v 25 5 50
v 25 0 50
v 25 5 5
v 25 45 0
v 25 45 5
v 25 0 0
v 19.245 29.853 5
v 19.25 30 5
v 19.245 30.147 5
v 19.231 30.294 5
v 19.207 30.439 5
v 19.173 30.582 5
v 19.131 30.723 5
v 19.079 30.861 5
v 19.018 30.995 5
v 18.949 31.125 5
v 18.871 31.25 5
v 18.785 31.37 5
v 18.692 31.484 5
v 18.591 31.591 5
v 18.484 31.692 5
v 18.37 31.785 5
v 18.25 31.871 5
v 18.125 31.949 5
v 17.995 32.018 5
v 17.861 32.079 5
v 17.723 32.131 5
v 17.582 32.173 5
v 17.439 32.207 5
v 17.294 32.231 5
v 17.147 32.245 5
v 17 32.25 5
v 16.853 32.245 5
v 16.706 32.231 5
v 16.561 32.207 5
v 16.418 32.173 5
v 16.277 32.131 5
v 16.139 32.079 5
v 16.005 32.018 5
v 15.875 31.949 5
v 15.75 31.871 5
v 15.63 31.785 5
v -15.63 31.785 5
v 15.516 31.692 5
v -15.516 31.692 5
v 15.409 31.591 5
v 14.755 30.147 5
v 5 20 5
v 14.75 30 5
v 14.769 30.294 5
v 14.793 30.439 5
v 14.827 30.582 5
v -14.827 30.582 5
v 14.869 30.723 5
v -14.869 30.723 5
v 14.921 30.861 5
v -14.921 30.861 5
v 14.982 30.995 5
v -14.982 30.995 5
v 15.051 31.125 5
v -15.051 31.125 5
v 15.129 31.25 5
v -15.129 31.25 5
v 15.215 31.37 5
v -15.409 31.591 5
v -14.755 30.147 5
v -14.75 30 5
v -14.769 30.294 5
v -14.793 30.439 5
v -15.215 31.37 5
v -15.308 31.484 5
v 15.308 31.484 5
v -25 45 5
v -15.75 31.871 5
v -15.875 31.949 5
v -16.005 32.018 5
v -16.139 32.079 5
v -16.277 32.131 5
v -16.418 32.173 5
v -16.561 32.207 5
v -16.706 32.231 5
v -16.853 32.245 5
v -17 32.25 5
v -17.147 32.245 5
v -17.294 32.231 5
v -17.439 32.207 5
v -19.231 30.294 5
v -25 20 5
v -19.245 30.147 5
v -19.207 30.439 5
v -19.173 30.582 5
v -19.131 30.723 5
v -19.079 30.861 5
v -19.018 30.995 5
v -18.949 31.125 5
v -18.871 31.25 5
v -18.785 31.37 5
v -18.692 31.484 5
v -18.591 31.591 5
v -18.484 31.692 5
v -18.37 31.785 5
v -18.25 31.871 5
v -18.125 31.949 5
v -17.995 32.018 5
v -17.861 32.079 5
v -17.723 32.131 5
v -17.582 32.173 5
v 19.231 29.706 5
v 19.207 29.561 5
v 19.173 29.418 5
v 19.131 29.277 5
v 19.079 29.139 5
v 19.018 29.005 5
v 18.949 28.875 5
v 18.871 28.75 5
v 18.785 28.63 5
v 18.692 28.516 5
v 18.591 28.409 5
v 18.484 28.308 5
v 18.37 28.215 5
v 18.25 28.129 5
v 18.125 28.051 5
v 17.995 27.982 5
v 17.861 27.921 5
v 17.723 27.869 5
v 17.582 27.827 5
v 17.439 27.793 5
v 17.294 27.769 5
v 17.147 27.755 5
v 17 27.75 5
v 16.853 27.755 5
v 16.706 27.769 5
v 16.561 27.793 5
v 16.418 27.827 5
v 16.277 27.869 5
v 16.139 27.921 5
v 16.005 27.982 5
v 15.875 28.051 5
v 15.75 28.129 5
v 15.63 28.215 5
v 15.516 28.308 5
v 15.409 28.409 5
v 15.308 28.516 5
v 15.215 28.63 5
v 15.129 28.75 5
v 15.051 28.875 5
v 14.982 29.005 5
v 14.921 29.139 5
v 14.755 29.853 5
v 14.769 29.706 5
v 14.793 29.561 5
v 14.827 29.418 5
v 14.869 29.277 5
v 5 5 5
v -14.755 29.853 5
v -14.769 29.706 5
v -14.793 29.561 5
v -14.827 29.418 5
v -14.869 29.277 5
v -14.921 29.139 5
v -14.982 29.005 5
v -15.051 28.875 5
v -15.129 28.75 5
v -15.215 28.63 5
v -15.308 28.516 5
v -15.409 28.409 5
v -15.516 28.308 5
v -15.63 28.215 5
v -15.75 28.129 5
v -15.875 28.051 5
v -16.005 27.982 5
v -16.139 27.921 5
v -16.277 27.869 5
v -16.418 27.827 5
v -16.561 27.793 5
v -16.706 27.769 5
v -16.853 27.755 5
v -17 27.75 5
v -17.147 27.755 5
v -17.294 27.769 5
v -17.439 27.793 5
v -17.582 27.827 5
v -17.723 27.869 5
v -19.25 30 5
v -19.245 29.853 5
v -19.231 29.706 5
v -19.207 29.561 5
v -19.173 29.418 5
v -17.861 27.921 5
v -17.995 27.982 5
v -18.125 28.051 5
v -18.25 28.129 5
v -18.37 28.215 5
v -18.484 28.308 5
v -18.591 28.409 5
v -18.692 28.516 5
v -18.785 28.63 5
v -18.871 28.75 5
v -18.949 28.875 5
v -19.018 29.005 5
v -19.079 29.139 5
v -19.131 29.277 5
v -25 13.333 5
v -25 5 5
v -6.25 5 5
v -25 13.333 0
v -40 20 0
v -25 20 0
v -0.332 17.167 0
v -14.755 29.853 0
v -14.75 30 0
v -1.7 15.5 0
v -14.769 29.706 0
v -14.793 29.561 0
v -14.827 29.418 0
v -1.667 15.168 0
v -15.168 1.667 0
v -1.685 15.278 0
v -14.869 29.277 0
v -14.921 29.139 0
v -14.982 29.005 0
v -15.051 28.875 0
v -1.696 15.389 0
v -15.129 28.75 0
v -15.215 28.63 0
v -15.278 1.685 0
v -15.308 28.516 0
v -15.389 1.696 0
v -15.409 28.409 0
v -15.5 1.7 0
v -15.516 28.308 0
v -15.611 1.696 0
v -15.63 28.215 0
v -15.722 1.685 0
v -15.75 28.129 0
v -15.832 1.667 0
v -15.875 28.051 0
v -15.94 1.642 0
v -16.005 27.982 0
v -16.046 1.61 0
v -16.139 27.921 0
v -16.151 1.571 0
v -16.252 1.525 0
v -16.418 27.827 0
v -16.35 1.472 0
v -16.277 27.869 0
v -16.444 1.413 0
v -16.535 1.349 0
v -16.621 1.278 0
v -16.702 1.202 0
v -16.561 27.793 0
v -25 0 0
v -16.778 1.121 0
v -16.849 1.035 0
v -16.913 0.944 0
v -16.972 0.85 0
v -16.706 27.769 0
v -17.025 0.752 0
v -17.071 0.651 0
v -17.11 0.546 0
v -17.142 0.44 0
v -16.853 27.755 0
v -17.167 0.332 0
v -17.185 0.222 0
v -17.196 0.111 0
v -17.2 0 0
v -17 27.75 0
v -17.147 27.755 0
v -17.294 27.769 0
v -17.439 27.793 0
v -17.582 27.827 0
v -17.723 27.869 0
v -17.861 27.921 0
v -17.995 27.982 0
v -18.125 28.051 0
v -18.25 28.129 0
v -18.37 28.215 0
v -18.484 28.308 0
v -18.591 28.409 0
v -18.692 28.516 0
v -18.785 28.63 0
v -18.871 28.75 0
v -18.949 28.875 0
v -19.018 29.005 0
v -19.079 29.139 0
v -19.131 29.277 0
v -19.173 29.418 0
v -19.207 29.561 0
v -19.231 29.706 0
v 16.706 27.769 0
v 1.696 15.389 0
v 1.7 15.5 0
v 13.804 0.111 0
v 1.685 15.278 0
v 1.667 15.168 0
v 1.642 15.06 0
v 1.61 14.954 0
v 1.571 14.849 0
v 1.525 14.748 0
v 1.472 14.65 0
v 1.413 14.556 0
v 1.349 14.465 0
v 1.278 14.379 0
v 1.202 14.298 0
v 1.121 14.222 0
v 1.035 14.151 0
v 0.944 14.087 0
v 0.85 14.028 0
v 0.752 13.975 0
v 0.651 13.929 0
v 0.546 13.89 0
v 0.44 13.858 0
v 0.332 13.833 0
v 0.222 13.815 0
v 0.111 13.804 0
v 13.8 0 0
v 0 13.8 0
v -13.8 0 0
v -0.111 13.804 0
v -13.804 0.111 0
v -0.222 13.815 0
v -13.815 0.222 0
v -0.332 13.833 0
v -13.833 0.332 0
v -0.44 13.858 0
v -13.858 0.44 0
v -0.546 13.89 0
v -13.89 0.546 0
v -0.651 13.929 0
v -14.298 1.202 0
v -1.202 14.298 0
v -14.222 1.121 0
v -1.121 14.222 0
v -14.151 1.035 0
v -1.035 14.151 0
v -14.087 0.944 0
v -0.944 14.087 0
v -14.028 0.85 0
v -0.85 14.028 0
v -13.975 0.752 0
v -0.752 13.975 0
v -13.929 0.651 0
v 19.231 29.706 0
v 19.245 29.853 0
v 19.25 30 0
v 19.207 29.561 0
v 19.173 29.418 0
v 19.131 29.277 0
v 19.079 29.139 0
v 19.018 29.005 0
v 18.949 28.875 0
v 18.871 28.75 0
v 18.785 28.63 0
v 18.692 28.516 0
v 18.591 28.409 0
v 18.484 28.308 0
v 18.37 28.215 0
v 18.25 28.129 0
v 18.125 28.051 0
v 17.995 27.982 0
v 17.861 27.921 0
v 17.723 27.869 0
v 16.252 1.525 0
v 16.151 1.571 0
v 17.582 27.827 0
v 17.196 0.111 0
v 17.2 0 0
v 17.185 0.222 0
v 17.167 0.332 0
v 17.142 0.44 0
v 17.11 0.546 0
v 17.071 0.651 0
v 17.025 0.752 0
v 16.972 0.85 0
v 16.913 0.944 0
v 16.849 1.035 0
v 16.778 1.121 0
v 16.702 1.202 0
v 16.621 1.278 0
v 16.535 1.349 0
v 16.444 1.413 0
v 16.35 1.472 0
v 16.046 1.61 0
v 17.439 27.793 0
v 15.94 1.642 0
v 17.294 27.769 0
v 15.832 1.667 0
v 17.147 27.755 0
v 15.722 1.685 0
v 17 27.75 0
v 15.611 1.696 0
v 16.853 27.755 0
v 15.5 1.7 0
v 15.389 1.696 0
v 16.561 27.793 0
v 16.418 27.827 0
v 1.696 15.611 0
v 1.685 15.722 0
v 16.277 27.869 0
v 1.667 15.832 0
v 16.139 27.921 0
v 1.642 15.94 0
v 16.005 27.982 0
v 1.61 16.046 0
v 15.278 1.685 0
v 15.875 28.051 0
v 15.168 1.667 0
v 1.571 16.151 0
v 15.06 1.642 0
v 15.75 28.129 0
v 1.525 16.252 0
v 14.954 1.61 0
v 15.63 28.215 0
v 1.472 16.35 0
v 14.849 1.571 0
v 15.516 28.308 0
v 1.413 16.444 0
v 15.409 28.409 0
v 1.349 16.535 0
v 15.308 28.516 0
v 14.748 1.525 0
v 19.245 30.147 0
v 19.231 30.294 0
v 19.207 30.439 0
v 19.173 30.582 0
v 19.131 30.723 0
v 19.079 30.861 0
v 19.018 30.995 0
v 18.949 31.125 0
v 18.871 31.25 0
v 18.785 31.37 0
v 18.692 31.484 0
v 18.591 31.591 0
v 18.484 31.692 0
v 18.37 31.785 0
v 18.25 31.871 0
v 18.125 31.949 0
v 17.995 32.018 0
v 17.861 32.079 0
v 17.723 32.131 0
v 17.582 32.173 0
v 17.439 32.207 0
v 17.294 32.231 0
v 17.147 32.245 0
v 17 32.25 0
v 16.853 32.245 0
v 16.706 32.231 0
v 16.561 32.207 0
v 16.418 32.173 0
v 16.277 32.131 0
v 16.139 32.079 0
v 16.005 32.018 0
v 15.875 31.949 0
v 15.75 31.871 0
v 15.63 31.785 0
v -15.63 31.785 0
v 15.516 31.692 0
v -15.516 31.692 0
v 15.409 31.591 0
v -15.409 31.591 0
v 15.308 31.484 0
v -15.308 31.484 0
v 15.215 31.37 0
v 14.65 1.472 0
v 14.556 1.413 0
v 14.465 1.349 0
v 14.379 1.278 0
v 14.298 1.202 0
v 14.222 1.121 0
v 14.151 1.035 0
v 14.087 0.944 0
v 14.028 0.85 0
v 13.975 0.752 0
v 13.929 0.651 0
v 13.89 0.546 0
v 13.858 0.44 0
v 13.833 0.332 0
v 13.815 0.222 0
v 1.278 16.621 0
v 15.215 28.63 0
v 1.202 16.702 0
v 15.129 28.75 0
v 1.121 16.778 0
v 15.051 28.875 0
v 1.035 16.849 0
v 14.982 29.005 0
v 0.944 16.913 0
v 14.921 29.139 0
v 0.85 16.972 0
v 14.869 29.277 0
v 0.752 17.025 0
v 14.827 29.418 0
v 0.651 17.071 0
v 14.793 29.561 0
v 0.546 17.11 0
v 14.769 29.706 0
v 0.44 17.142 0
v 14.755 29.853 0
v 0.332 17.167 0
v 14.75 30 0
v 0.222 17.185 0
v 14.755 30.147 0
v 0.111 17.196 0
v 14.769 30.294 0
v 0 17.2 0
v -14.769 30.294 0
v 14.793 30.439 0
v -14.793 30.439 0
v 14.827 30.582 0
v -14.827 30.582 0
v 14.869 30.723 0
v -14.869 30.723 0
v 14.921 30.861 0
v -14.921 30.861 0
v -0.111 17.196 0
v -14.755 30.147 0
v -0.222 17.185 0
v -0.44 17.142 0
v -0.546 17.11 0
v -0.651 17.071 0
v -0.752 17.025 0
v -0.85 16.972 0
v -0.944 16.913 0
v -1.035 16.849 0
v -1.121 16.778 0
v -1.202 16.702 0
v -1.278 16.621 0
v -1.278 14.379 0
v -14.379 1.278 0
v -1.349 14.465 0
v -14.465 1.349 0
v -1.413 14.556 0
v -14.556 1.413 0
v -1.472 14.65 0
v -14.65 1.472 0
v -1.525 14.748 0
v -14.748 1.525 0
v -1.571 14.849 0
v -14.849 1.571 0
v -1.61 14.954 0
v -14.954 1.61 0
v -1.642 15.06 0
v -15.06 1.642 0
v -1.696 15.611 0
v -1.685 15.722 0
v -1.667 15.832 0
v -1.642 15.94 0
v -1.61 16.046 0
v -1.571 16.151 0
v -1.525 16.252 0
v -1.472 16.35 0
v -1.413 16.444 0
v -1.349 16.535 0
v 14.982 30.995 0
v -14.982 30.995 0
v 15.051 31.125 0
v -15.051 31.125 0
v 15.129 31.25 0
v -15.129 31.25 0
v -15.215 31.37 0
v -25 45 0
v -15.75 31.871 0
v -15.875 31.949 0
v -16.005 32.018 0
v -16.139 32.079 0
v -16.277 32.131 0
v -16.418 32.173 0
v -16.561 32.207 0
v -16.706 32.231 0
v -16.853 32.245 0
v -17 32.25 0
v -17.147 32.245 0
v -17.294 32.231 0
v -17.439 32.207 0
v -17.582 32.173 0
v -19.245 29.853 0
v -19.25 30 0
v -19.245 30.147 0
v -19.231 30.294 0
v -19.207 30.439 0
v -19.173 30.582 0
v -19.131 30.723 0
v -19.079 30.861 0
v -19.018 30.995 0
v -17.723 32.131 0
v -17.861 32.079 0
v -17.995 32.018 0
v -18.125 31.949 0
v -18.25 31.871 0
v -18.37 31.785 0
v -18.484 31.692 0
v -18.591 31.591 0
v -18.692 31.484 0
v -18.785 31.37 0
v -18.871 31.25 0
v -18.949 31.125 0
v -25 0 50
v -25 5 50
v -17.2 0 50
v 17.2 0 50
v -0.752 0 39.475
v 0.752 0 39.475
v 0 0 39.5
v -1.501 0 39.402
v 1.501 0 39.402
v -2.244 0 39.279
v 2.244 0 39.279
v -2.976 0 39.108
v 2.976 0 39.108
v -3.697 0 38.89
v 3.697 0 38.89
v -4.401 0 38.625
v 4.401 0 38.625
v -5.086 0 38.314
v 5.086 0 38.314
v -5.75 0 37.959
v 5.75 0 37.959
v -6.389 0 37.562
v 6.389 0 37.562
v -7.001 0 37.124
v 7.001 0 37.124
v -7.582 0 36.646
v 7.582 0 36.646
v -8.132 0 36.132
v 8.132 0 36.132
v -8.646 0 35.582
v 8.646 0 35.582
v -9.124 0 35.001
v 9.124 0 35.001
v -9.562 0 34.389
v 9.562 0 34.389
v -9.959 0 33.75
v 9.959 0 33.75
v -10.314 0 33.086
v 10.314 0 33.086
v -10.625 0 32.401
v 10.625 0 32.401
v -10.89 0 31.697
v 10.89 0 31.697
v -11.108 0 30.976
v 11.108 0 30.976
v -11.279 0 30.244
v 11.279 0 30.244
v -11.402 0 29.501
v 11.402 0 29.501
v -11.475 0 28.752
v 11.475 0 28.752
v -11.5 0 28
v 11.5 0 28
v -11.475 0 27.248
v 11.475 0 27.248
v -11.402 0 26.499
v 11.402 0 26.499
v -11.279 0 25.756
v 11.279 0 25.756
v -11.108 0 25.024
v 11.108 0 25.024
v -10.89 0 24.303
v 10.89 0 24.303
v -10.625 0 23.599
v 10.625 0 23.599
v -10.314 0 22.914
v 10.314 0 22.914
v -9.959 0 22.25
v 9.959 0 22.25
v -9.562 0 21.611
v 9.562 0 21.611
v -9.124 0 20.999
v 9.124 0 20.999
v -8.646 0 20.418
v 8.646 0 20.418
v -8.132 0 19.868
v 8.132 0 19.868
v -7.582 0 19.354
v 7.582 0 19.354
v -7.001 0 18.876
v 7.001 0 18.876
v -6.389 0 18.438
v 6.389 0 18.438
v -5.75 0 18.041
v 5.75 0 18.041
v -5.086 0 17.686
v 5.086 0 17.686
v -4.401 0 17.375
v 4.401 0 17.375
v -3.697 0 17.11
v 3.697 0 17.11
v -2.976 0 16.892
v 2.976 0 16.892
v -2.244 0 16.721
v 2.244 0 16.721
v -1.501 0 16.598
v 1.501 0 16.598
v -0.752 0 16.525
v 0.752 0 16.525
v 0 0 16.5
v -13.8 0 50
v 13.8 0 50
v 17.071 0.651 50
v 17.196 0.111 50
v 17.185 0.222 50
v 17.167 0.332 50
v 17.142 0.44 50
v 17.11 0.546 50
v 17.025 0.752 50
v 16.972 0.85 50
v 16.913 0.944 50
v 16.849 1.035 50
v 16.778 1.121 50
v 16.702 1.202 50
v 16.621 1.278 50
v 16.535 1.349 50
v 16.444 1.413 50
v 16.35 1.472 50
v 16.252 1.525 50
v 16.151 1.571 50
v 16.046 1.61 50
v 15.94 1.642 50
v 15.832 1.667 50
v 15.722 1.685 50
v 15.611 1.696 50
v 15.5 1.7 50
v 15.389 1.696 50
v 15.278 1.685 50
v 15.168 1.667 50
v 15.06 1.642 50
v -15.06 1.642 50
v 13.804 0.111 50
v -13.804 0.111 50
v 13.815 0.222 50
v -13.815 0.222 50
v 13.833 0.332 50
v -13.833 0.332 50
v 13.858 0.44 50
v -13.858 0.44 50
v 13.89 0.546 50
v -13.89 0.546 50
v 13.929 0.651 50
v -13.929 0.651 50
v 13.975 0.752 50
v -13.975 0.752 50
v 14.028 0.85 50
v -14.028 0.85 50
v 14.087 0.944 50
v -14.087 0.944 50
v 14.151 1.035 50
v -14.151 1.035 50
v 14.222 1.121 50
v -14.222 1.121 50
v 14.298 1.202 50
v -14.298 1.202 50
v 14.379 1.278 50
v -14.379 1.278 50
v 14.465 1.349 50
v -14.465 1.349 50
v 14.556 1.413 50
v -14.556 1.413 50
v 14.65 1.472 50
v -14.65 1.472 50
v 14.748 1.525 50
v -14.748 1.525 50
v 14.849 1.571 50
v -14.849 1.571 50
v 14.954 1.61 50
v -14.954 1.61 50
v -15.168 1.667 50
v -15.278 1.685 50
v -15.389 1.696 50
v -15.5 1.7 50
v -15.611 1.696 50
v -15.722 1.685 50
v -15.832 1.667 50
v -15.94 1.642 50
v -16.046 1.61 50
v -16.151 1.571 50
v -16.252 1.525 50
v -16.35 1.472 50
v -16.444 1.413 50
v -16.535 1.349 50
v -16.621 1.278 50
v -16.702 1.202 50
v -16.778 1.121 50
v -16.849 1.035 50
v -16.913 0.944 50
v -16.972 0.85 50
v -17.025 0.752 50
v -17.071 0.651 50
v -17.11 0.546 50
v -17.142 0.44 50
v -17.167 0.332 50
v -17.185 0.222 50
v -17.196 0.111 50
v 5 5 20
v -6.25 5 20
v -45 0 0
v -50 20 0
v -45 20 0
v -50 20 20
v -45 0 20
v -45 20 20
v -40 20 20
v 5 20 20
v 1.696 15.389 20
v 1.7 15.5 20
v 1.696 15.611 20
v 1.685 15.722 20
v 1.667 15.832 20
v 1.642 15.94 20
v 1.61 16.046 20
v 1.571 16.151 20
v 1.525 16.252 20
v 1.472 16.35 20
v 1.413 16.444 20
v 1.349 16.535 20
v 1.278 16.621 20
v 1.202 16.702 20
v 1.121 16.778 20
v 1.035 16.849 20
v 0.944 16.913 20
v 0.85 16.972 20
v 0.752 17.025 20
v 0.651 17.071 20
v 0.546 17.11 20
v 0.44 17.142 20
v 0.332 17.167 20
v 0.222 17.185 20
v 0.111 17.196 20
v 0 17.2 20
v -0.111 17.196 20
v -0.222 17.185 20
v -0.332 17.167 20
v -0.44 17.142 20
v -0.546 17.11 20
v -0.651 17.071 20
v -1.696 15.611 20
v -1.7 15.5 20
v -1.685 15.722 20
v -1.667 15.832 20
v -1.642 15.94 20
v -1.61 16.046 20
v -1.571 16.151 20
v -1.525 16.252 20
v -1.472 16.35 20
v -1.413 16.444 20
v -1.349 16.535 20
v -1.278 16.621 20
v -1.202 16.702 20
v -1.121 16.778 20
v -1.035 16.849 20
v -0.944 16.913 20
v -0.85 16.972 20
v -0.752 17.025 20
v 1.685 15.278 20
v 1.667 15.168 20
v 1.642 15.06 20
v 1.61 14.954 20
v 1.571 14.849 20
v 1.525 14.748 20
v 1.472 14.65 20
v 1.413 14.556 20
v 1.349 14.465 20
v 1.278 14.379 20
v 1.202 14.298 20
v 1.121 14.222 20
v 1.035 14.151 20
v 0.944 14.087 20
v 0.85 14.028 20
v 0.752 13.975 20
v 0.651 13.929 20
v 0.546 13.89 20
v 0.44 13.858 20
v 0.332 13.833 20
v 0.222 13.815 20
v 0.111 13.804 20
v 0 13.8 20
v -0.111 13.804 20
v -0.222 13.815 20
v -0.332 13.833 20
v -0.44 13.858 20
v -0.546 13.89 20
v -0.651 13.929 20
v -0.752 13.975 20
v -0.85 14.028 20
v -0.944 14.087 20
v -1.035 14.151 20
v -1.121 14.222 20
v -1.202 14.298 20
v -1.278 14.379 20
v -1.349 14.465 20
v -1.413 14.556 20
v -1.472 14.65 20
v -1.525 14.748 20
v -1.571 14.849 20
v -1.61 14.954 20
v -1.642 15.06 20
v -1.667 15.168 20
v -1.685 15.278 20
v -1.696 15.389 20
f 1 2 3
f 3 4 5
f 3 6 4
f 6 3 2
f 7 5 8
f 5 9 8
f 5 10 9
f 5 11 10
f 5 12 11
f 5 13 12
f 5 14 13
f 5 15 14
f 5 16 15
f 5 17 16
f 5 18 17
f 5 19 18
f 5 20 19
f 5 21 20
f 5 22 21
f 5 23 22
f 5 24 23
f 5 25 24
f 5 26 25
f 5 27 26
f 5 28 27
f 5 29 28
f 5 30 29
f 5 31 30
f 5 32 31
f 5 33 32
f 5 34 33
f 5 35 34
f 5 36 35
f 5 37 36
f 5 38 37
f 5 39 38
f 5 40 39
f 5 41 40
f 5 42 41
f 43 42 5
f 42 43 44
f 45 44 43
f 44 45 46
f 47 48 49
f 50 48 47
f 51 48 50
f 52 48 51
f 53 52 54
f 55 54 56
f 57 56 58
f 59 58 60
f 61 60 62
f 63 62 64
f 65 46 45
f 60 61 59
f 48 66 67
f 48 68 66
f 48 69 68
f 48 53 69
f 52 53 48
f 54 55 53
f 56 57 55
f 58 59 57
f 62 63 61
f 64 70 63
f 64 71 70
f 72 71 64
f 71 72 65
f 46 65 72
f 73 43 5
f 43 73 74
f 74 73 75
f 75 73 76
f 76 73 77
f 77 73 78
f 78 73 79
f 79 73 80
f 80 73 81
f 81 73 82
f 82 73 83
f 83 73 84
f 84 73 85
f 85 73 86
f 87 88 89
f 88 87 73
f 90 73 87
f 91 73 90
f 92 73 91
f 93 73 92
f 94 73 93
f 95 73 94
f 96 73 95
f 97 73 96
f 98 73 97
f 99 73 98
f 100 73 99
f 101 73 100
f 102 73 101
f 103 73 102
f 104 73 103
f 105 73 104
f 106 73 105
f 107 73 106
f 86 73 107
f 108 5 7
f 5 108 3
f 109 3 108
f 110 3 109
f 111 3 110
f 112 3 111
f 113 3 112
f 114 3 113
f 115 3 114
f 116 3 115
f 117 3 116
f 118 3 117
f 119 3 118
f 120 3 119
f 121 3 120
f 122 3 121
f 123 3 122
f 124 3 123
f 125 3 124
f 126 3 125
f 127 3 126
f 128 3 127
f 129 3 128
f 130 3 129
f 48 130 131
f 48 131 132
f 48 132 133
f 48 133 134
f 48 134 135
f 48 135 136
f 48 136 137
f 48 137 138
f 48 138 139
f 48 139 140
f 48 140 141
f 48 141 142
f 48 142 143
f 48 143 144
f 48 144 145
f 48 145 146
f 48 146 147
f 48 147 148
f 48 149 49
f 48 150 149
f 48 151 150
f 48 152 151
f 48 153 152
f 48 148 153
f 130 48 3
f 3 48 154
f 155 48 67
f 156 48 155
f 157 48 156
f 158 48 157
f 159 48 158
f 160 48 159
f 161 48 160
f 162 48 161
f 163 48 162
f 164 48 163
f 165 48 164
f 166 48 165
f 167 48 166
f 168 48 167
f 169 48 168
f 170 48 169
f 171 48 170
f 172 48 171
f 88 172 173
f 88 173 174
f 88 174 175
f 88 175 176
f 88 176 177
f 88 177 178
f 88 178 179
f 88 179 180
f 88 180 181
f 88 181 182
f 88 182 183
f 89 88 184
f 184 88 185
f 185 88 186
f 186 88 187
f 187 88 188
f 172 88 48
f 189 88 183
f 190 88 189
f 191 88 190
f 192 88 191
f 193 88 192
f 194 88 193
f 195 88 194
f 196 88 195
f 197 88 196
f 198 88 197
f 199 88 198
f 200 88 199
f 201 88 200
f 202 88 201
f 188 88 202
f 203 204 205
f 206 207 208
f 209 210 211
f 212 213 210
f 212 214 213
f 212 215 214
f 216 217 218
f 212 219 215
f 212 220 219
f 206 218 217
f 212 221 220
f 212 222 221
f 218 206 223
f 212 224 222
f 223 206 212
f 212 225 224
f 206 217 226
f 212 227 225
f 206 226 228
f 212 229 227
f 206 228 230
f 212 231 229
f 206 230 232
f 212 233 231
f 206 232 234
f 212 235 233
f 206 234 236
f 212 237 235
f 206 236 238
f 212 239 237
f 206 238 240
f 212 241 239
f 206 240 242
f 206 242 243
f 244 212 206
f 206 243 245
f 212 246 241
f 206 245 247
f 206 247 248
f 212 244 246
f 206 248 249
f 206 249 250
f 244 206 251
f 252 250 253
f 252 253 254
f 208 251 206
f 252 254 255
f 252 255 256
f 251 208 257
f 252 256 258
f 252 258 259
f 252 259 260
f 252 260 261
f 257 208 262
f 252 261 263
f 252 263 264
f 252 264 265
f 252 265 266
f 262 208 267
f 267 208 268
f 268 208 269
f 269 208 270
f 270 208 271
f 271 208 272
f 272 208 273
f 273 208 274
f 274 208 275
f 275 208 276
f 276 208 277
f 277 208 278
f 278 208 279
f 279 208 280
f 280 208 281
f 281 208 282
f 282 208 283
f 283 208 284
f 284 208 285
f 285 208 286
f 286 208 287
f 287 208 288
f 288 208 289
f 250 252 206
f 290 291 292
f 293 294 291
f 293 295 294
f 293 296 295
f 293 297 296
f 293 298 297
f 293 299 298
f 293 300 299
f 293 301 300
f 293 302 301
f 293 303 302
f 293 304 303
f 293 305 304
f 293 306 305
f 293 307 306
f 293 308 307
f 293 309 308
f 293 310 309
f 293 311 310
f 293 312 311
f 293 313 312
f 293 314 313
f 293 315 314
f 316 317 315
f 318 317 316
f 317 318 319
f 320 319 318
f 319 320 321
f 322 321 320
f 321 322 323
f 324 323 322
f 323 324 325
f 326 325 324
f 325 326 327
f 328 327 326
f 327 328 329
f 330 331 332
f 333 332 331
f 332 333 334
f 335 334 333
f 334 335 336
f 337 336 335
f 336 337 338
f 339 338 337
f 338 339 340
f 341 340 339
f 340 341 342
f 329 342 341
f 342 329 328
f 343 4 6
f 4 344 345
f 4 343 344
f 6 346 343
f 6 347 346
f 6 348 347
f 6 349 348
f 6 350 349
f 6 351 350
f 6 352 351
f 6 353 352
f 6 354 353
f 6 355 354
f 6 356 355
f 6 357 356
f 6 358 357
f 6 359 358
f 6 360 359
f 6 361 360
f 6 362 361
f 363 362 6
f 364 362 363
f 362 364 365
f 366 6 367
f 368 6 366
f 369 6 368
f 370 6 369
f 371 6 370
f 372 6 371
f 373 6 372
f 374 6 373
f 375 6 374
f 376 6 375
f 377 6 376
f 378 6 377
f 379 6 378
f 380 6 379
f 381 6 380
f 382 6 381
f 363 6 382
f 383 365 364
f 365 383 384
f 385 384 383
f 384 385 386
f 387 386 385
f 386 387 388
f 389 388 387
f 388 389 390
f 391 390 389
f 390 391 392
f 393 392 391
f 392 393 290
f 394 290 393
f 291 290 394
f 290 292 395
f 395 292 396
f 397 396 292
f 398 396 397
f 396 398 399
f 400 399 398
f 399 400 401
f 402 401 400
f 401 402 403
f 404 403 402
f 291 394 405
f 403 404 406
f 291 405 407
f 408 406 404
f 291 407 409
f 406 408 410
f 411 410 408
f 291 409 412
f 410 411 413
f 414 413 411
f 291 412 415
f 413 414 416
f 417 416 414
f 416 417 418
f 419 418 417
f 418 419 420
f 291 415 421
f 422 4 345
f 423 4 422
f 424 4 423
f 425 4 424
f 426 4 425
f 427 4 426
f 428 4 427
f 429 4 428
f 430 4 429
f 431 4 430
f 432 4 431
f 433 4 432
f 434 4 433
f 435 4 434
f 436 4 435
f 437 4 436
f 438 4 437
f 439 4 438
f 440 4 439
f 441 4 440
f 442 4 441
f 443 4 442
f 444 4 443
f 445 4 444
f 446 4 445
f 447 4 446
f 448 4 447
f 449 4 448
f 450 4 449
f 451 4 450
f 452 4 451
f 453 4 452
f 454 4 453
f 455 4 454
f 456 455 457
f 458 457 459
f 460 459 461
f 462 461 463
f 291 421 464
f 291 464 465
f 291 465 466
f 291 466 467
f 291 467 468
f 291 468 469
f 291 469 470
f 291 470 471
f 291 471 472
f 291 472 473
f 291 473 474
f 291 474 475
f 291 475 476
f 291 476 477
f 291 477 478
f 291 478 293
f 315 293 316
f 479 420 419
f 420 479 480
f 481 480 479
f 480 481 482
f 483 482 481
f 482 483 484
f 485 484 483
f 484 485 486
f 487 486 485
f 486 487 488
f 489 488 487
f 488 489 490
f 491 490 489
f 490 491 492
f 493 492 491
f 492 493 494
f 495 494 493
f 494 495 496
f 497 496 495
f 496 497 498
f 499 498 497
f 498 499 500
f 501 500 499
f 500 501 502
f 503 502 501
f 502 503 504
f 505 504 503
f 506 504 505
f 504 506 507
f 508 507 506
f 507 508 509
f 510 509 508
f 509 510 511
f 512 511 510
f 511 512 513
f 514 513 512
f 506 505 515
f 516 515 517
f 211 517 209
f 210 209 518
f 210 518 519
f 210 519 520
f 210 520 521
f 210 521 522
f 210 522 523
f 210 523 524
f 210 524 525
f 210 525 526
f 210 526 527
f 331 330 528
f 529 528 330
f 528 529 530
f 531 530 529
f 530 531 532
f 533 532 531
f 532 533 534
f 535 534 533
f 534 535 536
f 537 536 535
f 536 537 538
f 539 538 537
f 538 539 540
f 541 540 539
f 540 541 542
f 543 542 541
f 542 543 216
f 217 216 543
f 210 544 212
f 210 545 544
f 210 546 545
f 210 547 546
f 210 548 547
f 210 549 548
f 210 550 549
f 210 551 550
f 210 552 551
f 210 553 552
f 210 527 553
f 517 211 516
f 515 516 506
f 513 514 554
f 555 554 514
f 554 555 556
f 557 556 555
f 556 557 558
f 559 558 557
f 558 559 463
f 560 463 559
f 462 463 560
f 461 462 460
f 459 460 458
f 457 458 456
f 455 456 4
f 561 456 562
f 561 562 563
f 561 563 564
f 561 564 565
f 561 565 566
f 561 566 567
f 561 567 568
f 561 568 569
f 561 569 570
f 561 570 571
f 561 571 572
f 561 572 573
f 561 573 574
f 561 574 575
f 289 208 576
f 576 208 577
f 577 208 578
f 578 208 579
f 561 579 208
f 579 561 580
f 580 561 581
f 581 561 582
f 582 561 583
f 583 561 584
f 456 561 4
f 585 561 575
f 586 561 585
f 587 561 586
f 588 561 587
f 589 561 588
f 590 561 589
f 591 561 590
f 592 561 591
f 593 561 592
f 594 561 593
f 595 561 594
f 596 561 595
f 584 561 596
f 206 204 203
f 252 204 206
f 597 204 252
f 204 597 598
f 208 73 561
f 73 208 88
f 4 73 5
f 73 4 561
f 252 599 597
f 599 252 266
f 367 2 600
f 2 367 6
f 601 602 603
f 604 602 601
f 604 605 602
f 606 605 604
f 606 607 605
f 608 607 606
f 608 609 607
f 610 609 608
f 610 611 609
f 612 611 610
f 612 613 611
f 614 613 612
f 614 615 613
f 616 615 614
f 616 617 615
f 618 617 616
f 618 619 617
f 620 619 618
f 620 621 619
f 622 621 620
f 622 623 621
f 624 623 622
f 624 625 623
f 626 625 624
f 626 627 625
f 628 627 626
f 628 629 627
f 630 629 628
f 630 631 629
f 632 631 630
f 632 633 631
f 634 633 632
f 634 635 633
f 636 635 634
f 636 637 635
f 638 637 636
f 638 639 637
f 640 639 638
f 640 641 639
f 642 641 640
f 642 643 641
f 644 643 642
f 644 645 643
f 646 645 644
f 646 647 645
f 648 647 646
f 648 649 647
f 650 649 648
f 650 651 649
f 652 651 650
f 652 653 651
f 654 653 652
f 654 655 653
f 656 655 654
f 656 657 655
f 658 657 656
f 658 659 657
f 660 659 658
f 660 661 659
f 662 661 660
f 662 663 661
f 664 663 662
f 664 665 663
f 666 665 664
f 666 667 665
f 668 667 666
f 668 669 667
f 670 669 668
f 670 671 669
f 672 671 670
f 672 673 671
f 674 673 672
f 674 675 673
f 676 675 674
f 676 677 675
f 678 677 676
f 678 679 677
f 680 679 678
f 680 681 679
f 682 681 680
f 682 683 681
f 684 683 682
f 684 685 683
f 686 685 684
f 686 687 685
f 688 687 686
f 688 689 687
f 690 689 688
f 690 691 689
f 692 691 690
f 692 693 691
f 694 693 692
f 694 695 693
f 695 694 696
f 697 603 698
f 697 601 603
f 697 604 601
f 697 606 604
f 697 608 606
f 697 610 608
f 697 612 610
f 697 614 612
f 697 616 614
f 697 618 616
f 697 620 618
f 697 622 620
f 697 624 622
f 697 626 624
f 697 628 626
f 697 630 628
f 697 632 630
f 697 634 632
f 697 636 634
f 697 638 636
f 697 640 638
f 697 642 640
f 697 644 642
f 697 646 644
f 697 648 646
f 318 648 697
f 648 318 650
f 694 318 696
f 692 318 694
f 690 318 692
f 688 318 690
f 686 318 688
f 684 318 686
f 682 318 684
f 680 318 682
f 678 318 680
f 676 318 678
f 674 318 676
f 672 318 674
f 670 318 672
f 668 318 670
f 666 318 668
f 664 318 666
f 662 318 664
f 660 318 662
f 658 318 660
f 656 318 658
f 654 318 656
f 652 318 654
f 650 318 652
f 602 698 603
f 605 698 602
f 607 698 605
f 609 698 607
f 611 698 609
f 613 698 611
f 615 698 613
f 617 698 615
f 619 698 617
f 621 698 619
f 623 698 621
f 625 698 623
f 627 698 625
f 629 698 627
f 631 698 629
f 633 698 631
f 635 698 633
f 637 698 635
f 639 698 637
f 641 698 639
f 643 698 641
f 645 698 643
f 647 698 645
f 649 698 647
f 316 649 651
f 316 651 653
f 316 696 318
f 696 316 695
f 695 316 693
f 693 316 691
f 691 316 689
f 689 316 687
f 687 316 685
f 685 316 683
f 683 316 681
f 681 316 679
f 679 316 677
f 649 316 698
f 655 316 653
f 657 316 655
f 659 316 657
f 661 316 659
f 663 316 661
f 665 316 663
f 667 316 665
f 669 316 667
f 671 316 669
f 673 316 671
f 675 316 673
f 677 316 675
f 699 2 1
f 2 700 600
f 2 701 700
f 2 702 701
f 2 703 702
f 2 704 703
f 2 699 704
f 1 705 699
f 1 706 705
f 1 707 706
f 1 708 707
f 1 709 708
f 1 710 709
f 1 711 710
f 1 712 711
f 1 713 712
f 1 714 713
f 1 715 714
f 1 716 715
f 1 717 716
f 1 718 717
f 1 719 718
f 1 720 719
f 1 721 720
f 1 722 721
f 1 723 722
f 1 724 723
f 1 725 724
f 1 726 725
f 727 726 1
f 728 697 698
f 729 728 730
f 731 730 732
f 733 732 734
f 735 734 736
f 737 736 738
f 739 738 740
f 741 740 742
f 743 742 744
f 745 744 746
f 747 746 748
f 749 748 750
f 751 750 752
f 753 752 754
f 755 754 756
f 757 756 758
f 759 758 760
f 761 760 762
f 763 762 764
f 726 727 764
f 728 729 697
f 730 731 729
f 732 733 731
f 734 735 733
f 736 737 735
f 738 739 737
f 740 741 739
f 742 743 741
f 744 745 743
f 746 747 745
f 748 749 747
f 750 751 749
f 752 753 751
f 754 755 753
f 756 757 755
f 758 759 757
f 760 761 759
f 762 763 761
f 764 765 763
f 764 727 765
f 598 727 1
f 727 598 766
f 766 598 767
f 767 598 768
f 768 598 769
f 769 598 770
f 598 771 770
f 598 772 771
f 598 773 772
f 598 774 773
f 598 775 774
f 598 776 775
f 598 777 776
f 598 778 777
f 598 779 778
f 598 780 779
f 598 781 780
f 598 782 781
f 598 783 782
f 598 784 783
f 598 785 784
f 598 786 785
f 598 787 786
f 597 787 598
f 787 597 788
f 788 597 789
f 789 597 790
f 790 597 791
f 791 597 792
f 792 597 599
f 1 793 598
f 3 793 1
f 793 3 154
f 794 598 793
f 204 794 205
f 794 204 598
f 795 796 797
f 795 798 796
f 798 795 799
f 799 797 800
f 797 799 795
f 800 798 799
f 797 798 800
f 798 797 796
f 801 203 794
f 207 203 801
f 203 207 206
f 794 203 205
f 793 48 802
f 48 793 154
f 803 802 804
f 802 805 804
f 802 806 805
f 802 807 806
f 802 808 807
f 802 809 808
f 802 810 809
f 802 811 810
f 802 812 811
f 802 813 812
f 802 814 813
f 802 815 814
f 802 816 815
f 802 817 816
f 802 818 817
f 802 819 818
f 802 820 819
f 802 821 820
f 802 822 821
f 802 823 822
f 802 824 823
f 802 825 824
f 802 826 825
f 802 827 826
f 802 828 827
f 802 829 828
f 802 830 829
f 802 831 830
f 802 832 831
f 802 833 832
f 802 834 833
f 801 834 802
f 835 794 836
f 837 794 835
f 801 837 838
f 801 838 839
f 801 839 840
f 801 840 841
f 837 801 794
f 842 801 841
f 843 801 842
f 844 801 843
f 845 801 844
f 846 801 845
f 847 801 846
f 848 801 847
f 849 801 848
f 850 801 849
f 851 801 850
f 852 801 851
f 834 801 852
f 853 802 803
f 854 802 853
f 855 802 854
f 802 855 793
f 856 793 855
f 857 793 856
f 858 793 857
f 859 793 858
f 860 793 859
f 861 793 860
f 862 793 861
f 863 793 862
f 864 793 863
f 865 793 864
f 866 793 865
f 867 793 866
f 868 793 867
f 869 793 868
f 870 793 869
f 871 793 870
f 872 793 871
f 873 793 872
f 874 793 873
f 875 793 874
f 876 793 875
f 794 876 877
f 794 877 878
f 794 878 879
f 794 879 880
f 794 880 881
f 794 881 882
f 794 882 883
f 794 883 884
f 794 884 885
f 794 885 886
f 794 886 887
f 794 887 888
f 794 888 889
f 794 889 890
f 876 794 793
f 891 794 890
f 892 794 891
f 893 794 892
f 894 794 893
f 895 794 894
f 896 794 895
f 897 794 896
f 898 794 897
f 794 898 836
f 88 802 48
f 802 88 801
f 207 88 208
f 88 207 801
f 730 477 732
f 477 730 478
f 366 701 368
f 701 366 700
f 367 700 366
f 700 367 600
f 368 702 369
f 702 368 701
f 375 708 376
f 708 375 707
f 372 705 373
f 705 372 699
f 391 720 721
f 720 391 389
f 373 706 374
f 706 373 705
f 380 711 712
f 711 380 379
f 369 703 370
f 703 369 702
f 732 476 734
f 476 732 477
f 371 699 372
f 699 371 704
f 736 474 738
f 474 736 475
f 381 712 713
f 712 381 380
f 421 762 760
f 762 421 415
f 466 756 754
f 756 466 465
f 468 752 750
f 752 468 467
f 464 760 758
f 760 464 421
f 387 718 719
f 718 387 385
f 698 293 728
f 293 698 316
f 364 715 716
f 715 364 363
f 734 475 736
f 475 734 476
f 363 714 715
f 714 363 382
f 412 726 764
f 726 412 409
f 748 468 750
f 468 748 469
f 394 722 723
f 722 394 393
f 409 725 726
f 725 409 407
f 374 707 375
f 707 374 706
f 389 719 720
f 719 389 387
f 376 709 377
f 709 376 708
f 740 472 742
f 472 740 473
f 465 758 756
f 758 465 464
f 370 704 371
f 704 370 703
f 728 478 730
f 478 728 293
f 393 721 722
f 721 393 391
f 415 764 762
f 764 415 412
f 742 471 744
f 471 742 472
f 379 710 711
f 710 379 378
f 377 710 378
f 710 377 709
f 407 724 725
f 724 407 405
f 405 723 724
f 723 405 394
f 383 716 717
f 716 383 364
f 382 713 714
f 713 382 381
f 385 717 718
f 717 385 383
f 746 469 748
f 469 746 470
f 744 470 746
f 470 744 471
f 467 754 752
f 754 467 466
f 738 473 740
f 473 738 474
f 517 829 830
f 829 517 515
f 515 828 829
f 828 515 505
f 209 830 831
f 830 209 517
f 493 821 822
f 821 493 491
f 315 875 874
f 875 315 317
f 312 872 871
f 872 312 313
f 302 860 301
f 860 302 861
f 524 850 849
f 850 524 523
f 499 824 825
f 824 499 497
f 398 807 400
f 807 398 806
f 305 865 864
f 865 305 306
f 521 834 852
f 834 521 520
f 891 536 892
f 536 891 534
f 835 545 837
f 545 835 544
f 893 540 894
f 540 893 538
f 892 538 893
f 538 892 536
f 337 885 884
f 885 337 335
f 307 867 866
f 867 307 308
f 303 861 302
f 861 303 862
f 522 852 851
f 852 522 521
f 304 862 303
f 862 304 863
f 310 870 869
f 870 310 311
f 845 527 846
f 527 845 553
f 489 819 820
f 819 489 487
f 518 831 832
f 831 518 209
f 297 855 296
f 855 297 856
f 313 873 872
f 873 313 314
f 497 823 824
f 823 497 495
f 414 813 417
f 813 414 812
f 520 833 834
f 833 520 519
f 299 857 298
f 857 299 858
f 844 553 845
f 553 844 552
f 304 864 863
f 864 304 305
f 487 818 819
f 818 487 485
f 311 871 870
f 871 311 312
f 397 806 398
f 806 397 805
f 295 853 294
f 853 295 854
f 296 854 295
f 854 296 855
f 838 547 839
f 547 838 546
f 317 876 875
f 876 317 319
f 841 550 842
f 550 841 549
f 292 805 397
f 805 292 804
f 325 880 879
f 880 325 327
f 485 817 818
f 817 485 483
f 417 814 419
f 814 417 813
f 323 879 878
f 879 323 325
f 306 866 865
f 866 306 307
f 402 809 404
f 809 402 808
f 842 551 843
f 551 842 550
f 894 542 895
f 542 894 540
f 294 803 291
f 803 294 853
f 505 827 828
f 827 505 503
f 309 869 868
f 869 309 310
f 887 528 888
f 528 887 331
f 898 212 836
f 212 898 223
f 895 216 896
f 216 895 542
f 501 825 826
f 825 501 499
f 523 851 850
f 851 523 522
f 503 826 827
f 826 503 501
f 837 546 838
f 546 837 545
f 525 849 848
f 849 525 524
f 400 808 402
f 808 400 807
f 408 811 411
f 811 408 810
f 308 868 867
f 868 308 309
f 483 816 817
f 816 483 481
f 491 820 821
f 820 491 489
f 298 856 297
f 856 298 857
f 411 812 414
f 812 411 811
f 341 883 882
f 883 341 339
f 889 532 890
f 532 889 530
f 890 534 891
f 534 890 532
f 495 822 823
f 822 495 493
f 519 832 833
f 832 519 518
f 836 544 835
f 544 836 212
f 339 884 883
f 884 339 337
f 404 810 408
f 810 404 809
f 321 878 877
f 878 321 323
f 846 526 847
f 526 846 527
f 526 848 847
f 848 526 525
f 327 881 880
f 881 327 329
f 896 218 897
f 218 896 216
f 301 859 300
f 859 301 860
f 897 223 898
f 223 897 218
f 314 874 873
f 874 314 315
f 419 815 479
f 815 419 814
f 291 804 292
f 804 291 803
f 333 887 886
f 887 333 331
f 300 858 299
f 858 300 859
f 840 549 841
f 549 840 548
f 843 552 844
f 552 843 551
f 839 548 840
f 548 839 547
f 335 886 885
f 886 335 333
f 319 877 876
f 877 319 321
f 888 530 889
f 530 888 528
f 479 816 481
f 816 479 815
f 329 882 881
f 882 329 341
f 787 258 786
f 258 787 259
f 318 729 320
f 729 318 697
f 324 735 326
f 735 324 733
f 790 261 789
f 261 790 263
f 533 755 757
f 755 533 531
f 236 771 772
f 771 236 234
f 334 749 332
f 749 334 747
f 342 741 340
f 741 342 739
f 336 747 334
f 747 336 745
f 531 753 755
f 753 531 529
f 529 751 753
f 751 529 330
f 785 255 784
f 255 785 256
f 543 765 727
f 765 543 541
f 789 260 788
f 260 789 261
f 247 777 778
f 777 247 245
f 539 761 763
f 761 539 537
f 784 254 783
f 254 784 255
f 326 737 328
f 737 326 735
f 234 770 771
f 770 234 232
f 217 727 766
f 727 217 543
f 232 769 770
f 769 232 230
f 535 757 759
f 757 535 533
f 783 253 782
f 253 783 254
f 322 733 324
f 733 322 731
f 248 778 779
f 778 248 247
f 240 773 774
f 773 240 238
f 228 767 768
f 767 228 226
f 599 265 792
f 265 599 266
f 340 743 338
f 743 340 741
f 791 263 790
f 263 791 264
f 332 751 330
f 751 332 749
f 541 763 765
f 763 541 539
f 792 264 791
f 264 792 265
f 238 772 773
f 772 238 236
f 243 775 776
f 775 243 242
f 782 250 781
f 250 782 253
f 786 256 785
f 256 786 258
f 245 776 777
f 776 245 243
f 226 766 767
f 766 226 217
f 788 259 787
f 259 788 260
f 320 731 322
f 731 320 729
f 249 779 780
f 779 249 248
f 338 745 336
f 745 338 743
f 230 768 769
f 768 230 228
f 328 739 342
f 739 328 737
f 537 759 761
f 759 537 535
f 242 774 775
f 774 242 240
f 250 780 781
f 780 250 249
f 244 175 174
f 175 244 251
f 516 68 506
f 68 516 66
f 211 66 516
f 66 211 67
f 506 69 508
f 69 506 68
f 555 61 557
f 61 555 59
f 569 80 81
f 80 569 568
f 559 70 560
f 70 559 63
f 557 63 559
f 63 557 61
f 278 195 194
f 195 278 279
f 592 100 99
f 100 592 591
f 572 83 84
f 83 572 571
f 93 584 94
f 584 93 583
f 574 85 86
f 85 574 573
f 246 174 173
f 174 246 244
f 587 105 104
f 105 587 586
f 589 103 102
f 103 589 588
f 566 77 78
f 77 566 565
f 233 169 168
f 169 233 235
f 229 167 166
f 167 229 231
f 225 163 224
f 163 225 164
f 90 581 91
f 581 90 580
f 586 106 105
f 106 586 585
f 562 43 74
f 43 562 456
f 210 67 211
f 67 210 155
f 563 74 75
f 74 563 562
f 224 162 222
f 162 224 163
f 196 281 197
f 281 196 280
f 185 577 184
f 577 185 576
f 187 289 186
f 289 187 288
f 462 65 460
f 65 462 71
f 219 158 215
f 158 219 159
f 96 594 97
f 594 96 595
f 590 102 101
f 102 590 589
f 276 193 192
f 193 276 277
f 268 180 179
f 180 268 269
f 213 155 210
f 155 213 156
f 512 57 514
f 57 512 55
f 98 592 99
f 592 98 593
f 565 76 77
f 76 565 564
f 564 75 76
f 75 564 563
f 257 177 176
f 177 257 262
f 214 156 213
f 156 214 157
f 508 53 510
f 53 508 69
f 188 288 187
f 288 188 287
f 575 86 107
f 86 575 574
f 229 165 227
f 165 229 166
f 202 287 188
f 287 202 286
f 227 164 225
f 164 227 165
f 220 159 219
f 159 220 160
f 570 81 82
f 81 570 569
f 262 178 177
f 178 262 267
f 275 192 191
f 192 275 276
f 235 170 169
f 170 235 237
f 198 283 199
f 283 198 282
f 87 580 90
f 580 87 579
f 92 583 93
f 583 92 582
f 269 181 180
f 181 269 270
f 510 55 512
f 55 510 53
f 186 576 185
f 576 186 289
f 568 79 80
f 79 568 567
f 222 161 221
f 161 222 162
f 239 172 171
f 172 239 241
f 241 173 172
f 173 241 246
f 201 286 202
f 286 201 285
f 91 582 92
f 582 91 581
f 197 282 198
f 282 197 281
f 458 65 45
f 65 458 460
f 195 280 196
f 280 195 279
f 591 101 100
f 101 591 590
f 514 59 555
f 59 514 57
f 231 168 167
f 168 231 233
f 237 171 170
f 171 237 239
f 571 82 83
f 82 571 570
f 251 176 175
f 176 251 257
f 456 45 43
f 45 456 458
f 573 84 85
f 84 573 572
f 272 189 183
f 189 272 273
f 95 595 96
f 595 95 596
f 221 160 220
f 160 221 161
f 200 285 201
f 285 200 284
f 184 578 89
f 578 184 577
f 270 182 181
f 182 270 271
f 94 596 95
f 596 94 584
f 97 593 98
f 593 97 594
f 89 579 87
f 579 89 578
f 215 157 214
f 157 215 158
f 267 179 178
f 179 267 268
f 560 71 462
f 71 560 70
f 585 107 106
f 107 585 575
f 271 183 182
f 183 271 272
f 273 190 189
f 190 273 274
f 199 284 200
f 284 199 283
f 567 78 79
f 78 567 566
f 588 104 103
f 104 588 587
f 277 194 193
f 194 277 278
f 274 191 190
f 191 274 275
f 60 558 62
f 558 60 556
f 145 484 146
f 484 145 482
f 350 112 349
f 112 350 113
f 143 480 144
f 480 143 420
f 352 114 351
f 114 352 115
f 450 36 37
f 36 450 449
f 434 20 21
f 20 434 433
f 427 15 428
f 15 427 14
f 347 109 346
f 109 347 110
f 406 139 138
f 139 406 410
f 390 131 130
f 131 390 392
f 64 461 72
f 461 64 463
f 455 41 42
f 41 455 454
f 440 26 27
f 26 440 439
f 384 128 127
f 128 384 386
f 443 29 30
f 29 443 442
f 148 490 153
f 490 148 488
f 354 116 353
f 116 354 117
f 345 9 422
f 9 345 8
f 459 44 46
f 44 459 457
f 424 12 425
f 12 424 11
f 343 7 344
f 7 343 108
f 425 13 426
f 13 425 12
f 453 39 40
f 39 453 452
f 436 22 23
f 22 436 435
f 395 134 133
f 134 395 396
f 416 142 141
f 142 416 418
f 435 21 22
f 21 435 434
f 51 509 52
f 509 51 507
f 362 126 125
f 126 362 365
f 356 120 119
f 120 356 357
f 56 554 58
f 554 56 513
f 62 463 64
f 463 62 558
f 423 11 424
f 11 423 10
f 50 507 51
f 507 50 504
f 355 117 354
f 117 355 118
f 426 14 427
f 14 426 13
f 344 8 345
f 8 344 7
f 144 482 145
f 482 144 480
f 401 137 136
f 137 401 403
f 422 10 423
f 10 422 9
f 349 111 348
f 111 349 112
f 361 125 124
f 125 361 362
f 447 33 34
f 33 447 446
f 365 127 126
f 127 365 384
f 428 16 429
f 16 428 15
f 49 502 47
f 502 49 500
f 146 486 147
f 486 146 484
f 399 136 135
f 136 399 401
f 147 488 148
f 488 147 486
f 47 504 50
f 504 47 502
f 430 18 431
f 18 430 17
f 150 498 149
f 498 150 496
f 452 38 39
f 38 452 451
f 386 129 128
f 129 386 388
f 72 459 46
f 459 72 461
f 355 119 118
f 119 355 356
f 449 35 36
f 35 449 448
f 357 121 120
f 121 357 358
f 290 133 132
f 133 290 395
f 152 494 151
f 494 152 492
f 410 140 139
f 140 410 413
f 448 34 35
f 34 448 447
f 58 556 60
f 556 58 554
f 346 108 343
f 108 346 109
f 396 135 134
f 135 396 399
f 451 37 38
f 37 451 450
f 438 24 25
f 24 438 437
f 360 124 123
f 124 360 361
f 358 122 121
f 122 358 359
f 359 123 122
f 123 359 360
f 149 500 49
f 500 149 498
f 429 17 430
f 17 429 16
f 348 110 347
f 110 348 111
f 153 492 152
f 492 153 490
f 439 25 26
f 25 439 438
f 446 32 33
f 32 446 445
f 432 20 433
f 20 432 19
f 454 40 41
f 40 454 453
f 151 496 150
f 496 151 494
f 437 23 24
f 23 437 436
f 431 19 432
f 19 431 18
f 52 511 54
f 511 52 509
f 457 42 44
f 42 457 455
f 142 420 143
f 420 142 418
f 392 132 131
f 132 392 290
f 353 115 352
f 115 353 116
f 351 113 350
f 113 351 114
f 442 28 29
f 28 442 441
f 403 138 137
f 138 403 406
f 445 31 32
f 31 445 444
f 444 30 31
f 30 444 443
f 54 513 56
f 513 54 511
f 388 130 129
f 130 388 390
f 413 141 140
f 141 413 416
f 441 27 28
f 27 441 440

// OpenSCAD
// L-shaped mounting bracket for NEMA 17 stepper motor
// Print orientation: base plate on bed (z = 0), motor plate builds upward (+Z)

// ---------------- Parameters ----------------
base_x0      = -25;    // base plate: x start
base_x1      = 25;     // base plate: x end
base_y0      = 0;      // base plate: y start
base_y1      = 45;     // base plate: y end
base_z0      = 0;      // base plate: z start
base_z1      = 5;      // base plate: z end

hole_m4_x1   = -17;    // M4 through-hole 1: x
hole_m4_y1   = 30;     // M4 through-hole 1: y
hole_m4_x2   = 17;     // M4 through-hole 2: x
hole_m4_y2   = 30;     // M4 through-hole 2: y
hole_m4_d    = 4.5;    // M4 hole diameter

motor_x0     = -25;    // motor plate: x start
motor_x1     = 25;     // motor plate: x end
motor_y0     = 0;      // motor plate: y start
motor_y1     = 5;      // motor plate: y end
motor_z0     = 0;      // motor plate: z start
motor_z1     = 50;     // motor plate: z end

boss_hole_d  = 23;     // motor centring boss hole diameter
boss_hole_x  = 0;      // boss hole centre: x
boss_hole_z  = 28;     // boss hole centre: z

screw_d      = 3.4;    // M3 screw hole diameter
screw_pitch  = 31;     // square pattern side length

gusset_t     = 5;      // gusset thickness (X)
gusset_leg   = 20;     // right triangle leg length (Y and Z)
gusset_x0    = -25;    // left gusset: x start
gusset_x1    = -20;    // left gusset: x end

eps          = 0.5;    // cutter overshoot past faces

$fn = 96;

// ---------------- Model ----------------
difference() {
    union() {
        // Base plate
        translate([base_x0, base_y0, base_z0])
            cube([base_x1 - base_x0, base_y1 - base_y0, base_z1 - base_z0]);

        // Vertical motor plate
        translate([motor_x0, motor_y0, motor_z0])
            cube([motor_x1 - motor_x0, motor_y1 - motor_y0, motor_z1 - motor_z0]);

        // Left gusset (flush with left edge)
        translate([gusset_x0, motor_y0, motor_z0])
            linear_extrude(height = gusset_leg, rotate_extrude = false)
                polygon(points = [
                    [gusset_x1, motor_y0],
                    [gusset_x1, motor_y0 + gusset_leg],
                    [gusset_x0, motor_y0 + gusset_leg]
                ]);

        // Right gusset (flush with right edge)
        translate([gusset_x1, motor_y0, motor_z0])
            linear_extrude(height = gusset_leg, rotate_extrude = false)
                polygon(points = [
                    [motor_x1, motor_y0],
                    [motor_x1, motor_y0 + gusset_leg],
                    [gusset_x1, motor_y0 + gusset_leg]
                ]);
    }

    // M4 through-holes in base plate
    translate([hole_m4_x1, hole_m4_y1, -eps])
        cylinder(d = hole_m4_d, h = base_z1 - base_z0 + 2 * eps);

    translate([hole_m4_x2, hole_m4_y2, -eps])
        cylinder(d = hole_m4_d, h = base_z1 - base_z0 + 2 * eps);

    // Boss hole through motor plate (along Y)
    translate([boss_hole_x, 0, boss_hole_z])
        rotate([90, 0, 0])
            cylinder(d = boss_hole_d, h = motor_y1 - motor_y0 + 2 * eps);

    // M3 screw holes on 31 mm square pattern, centred on boss hole
    for (a = [0, 90, 180, 270])
        rotate([0, 0, a])
            translate([screw_pitch / 2, 0, 0])
                cylinder(d = screw_d, h = motor_z1 - motor_z0 + 2 * eps);
}
